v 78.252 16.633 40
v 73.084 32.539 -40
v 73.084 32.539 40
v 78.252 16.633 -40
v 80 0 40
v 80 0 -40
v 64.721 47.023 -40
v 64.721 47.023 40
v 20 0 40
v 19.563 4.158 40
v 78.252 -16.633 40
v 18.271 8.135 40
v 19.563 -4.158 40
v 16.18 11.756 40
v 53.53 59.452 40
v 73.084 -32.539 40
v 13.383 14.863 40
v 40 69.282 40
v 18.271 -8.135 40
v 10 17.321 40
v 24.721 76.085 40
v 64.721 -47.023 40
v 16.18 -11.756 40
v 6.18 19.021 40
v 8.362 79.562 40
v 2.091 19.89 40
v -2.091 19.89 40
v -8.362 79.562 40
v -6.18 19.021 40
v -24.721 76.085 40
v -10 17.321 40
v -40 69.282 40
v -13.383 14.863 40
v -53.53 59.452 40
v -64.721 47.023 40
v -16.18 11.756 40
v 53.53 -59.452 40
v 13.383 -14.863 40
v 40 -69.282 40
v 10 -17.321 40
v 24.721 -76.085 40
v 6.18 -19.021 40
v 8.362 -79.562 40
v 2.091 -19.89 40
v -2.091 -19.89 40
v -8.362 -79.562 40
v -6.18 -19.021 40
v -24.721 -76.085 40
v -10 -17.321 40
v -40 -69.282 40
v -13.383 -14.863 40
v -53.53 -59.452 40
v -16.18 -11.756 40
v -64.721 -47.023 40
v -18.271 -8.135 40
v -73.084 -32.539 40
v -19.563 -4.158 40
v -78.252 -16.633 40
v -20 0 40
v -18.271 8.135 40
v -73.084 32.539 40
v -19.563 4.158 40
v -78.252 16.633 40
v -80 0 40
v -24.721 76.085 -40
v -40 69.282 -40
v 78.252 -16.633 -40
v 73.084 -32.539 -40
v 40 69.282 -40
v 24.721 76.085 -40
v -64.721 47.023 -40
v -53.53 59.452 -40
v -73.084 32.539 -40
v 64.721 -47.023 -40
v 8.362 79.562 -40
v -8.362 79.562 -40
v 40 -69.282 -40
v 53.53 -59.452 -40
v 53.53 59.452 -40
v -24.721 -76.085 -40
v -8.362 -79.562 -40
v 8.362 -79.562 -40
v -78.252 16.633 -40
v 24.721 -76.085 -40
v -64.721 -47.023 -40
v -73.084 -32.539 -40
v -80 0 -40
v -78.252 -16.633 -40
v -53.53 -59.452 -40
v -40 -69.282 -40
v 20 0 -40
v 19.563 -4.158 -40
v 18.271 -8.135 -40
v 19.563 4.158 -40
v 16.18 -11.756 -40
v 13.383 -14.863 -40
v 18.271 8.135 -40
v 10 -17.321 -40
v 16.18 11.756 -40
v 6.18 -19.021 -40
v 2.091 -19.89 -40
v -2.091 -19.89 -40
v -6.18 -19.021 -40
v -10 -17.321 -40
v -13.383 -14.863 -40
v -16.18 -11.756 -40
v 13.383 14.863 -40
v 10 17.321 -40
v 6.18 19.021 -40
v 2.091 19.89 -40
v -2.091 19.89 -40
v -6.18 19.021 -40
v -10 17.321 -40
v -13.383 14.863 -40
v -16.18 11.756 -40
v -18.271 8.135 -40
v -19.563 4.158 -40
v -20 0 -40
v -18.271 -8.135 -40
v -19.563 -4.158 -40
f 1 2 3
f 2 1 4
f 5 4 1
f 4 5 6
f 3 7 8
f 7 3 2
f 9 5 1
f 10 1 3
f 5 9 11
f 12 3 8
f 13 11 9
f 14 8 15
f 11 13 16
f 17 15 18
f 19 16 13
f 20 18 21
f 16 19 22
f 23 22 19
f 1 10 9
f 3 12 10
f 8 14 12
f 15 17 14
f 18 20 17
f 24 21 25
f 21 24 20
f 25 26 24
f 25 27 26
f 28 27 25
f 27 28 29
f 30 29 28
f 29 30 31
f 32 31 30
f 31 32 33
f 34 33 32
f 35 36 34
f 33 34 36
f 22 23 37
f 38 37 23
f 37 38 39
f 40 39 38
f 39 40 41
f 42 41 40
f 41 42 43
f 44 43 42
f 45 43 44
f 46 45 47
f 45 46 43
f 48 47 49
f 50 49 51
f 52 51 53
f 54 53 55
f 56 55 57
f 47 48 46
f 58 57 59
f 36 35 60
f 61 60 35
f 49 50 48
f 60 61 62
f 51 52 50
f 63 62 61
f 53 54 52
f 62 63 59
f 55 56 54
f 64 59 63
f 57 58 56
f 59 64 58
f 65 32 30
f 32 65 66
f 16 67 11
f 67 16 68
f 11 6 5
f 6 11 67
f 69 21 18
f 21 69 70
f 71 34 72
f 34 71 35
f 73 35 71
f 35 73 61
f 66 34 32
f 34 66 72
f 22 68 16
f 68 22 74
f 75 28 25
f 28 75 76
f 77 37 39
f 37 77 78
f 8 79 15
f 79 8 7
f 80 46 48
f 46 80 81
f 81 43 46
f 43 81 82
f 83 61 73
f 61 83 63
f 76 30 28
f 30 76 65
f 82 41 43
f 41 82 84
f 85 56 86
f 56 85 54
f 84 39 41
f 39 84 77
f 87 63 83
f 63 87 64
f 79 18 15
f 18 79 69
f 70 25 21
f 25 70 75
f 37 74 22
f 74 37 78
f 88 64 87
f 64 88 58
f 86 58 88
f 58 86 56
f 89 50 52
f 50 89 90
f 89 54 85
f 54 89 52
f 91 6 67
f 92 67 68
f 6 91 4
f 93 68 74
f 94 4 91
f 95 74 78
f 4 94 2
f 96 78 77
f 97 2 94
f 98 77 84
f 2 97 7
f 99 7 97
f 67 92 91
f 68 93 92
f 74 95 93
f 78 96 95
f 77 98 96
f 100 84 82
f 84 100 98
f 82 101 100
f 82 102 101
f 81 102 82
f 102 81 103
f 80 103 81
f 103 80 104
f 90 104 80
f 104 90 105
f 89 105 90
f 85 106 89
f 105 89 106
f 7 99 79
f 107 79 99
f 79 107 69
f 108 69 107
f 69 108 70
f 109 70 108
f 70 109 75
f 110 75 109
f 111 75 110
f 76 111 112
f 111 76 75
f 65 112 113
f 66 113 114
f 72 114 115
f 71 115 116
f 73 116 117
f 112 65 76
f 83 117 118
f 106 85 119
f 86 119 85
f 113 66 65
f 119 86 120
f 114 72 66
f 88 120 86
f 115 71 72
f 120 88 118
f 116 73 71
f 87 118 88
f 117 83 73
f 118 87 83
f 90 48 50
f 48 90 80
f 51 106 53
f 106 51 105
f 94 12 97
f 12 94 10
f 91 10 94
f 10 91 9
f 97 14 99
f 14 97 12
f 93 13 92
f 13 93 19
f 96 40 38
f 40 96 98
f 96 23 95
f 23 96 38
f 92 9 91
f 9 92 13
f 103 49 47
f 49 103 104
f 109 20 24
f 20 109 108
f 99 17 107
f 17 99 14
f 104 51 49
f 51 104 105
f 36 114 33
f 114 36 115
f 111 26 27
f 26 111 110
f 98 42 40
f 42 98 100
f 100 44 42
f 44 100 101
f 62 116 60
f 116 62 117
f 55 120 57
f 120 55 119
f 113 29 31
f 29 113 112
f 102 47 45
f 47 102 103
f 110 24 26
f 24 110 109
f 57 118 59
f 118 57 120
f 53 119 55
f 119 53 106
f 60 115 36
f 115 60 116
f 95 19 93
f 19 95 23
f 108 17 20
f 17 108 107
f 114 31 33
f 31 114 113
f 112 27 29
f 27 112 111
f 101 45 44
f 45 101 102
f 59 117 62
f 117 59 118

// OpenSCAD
module Wheel(diameter, width, hole=0){
    difference(){
        cylinder(h=width, d=diameter, center=true);
        cylinder(h=width*1.1, d=hole, center=true);
    }
}

Wheel(diameter=160, width=80, hole=40);
